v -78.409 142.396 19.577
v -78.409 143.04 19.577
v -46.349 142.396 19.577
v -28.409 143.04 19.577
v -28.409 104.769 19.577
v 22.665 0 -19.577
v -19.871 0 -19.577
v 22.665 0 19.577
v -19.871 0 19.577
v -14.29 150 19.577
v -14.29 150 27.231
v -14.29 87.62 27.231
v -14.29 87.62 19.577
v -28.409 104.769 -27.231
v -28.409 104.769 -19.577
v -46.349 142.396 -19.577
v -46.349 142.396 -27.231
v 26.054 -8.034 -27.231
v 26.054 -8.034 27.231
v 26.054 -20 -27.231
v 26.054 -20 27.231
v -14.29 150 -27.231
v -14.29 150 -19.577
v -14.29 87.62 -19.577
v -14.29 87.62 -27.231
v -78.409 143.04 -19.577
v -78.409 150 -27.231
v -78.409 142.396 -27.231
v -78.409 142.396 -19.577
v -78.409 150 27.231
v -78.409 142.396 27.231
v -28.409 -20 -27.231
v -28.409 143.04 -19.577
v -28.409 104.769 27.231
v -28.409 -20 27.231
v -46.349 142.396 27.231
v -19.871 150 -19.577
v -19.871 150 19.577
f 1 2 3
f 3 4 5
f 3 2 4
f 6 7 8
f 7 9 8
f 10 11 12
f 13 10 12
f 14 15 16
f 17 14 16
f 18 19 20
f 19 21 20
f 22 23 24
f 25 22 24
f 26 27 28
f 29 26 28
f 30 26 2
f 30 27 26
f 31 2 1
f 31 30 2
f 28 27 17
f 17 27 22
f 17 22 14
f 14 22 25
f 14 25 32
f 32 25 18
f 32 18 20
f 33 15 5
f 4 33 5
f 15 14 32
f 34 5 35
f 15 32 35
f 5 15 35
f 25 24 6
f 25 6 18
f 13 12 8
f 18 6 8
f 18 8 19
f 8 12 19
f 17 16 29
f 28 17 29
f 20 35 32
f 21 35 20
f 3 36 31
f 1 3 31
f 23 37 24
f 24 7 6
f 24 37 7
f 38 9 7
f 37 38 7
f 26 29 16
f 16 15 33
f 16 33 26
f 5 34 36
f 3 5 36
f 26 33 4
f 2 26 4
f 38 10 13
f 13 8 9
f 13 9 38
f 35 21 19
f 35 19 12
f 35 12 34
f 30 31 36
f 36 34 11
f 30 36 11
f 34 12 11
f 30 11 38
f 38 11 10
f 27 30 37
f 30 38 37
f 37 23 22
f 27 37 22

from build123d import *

# Parameters (mm, degrees)
F1_DEPTH = 20
F3_DEPTH = 150
F5_DEPTH = 50
F7_DEPTH = 54.463615
F9_DEPTH = 54.463615


with BuildPart() as f1:
    # F0 (on Front) → F1 (new body)
    with BuildSketch(Plane.XZ):
        Polygon((-28.408879, 27.231308), (-28.408879, 0), (-28.408879, -27.231308), (26.05374, -27.231308), (26.05374, 0), (26.05374, 27.231308), align=None)
    extrude(amount=F1_DEPTH)

    # F2 (on face) → F3 (join)
    with BuildSketch(Plane(origin=(0, 0, 0), x_dir=(-1, 0, 0), z_dir=(0, 1, 0))):
        Polygon((28.408879, -27.231308), (28.408879, 27.231308), (-26.05374, 27.231308), (-26.05374, 19.577103), (19.871499, 19.577103), (19.871499, 0), (19.871499, -19.577103), (-26.05374, -19.577103), (-26.05374, -27.231308), align=None)
    extrude(amount=F3_DEPTH)

    # F4 (on face) → F5 (join)
    with BuildSketch(Plane(origin=(-28.408879, 0, 0), x_dir=(0, -1, 0), z_dir=(-1, 0, 0))):
        Polygon((-150, 27.231308), (-150, 0), (-150, -27.231308), (-104.768693, -27.231308), (-104.768693, -19.577103), (-143.039733, -19.577103), (-143.039733, 0), (-143.039733, 19.577103), (-104.768693, 19.577103), (-104.768693, 27.231308), align=None)
    extrude(amount=F5_DEPTH)

    # F6 (on face) → F7 (cut, through all)
    with BuildSketch(Plane.XY.offset(27.231308)):
        Polygon((-14.289723, 87.620333), (26.05374, -8.034108), (26.05374, 150), (-14.289723, 150), align=None)
    extrude(amount=-F7_DEPTH, mode=Mode.SUBTRACT)

    # F8 (on face) → F9 (cut, through all)
    with BuildSketch(Plane.XY.offset(27.231308)):
        Polygon((-78.408879, 104.768693), (-28.408879, 104.768693), (-46.349301, 142.396316), (-78.408879, 142.396316), align=None)
    extrude(amount=-F9_DEPTH, mode=Mode.SUBTRACT)


solid = f1.part
